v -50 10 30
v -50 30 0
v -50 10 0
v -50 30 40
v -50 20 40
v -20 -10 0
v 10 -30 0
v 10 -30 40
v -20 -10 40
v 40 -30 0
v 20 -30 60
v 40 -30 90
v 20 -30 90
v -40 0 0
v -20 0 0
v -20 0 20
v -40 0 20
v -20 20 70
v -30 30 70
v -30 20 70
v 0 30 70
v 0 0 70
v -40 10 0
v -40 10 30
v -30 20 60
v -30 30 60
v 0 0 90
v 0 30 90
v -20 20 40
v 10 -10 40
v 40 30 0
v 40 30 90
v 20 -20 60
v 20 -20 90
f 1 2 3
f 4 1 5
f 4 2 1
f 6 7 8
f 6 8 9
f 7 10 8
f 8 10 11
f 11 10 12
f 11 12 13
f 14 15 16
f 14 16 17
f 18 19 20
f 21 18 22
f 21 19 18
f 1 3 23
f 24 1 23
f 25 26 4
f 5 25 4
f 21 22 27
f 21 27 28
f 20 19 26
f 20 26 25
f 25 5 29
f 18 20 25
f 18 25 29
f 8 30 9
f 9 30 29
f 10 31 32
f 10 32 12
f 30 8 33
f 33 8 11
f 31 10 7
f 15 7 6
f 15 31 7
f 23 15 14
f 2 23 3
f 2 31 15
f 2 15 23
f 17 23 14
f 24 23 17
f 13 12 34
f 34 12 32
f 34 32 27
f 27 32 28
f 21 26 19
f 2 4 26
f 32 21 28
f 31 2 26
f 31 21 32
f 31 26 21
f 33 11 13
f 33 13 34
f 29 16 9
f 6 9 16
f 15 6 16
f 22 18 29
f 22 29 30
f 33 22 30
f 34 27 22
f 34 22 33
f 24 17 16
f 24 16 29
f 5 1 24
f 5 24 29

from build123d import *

# Parameters (mm, degrees)
BOSS_EXTRUDE1_DEPTH  = 90
BOSS_EXTRUDE2_DEPTH  = 70
BOSS_EXTRUDE4_DEPTH  = 10
SKETCH4_W            = 20
SKETCH4_H            = 40
BOSS_EXTRUDE6_DEPTH  = 20
CUT_EXTRUDE1_DEPTH   = 20
SKETCH9_W            = 20
SKETCH9_H            = 20
BOSS_EXTRUDE8_DEPTH  = 10
SKETCH10_W           = 20
SKETCH10_H           = 10
CUT_EXTRUDE2_DEPTH   = 10
BOSS_EXTRUDE9_START  = -10
BOSS_EXTRUDE9_DEPTH  = 20
SKETCH13_W           = 26.1880454
SKETCH13_H           = 20
BOSS_EXTRUDE13_DEPTH = 30
CUT_EXTRUDE3_DEPTH   = 10
BOSS_EXTRUDE14_DEPTH = 30
BOSS_EXTRUDE15_DEPTH = 30
BOSS_EXTRUDE16_DEPTH = 40
BOSS_EXTRUDE17_DEPTH = 40
BOSS_EXTRUDE18_DEPTH = 10


with BuildPart() as part:
    # Sketch1 → Boss-Extrude1 (new body)
    with BuildSketch(Plane.XY):
        Polygon((0, 0), (0, 30), (40, 30), (40, -30), (20, -30), (20, -20), align=None)
    extrude(amount=BOSS_EXTRUDE1_DEPTH)

    # Sketch2 → Boss-Extrude2 (add)
    with BuildSketch(Plane.XY.offset(70)):
        Polygon((0, 30), (-30, 30), (-30, 20), (-20, 20), (0, 0), align=None)
    extrude(amount=-BOSS_EXTRUDE2_DEPTH)

    # Sketch3 → Boss-Extrude4 (add)
    with BuildSketch(Plane(origin=(0, 30, 0), x_dir=(1, 0, 0), z_dir=(0, 1, 0))):
        Polygon((-30, -60), (-50, -40), (-30, -40), align=None)
    extrude(amount=-BOSS_EXTRUDE4_DEPTH)

    # Sketch4 → Boss-Extrude6 (add)
    with BuildSketch(Plane(origin=(0, 30, 0), x_dir=(1, 0, 0), z_dir=(0, 1, 0))):
        with Locations((-40, -20)):
            Rectangle(SKETCH4_W, SKETCH4_H)
    extrude(amount=-BOSS_EXTRUDE6_DEPTH)

    # Sketch6 → Cut-Extrude1 (cut)
    with BuildSketch(Plane.ZY.offset(50)):
        Polygon((40, 20), (30, 10), (40, 10), align=None)
    extrude(amount=-CUT_EXTRUDE1_DEPTH, mode=Mode.SUBTRACT)

    # Sketch9 → Boss-Extrude8 (add)
    with BuildSketch(Plane.XZ.offset(-10)):
        with Locations((-40, 10)):
            Rectangle(SKETCH9_W, SKETCH9_H)
    extrude(amount=BOSS_EXTRUDE8_DEPTH)

    # Sketch10 → Cut-Extrude2 (cut)
    with BuildSketch(Plane.ZY.offset(50)):
        with Locations((10, 5)):
            Rectangle(SKETCH10_W, SKETCH10_H)
    extrude(amount=-CUT_EXTRUDE2_DEPTH, mode=Mode.SUBTRACT)

    # Sketch11 → Boss-Extrude9 (add)
    with BuildSketch(Plane(origin=(-30, 0, 0), x_dir=(0, 0, -1), z_dir=(1, 0, 0)).offset(BOSS_EXTRUDE9_START)):
        Polygon((-20, 0), (-30, 10), (-20, 10), align=None)
    extrude(amount=BOSS_EXTRUDE9_DEPTH)

    # Sketch13 → Boss-Extrude13 (add)
    with BuildSketch(Plane(origin=(0, 0, 0), x_dir=(-1, 0, 0), z_dir=(0, 0, -1))):
        with Locations((16.9059773, 10)):
            Rectangle(SKETCH13_W, SKETCH13_H)
    extrude(amount=-BOSS_EXTRUDE13_DEPTH)

    # Sketch14 → Cut-Extrude3 (cut)
    with BuildSketch(Plane.ZY.offset(30)):
        Polygon((20, 0), (30, 10), (30, 0), align=None)
    extrude(amount=-CUT_EXTRUDE3_DEPTH, mode=Mode.SUBTRACT)

    # Sketch15 → Boss-Extrude14 (add)
    with BuildSketch(Plane.ZY.offset(50)):
        Polygon((30, 10), (30, 20), (40, 20), align=None)
    extrude(amount=-BOSS_EXTRUDE14_DEPTH)

    # Sketch16 → Boss-Extrude15 (add)
    with BuildSketch(Plane.XZ.offset(30)):
        Polygon((20, 0), (10, 0), (10, 40), (20, 60), align=None)
    extrude(amount=-BOSS_EXTRUDE15_DEPTH)

    # Sketch17 → Boss-Extrude16 (add)
    with BuildSketch(Plane(origin=(0, 0, 0), x_dir=(-1, 0, 0), z_dir=(0, 0, -1))):
        Polygon((-10, -30), (20, -10), (20, 0), (0, 0), (-10, -10), align=None)
    extrude(amount=-BOSS_EXTRUDE16_DEPTH)

    # Sketch18 → Boss-Extrude17 (add)
    with BuildSketch(Plane(origin=(0, 0, 0), x_dir=(-1, 0, 0), z_dir=(0, 0, -1))):
        Polygon((3.8119546, 3.8119546), (3.8119546, 0), (0, 0), align=None)
    extrude(amount=-BOSS_EXTRUDE17_DEPTH)

    # Sketch19 → Boss-Extrude18 (add)
    with BuildSketch(Plane.XY.offset(30)):
        Polygon((-3.8119546, 3.8119546), (-3.8119546, 0), (-20, 0), (-20, 20), align=None)
    extrude(amount=BOSS_EXTRUDE18_DEPTH)


solid = part.part
